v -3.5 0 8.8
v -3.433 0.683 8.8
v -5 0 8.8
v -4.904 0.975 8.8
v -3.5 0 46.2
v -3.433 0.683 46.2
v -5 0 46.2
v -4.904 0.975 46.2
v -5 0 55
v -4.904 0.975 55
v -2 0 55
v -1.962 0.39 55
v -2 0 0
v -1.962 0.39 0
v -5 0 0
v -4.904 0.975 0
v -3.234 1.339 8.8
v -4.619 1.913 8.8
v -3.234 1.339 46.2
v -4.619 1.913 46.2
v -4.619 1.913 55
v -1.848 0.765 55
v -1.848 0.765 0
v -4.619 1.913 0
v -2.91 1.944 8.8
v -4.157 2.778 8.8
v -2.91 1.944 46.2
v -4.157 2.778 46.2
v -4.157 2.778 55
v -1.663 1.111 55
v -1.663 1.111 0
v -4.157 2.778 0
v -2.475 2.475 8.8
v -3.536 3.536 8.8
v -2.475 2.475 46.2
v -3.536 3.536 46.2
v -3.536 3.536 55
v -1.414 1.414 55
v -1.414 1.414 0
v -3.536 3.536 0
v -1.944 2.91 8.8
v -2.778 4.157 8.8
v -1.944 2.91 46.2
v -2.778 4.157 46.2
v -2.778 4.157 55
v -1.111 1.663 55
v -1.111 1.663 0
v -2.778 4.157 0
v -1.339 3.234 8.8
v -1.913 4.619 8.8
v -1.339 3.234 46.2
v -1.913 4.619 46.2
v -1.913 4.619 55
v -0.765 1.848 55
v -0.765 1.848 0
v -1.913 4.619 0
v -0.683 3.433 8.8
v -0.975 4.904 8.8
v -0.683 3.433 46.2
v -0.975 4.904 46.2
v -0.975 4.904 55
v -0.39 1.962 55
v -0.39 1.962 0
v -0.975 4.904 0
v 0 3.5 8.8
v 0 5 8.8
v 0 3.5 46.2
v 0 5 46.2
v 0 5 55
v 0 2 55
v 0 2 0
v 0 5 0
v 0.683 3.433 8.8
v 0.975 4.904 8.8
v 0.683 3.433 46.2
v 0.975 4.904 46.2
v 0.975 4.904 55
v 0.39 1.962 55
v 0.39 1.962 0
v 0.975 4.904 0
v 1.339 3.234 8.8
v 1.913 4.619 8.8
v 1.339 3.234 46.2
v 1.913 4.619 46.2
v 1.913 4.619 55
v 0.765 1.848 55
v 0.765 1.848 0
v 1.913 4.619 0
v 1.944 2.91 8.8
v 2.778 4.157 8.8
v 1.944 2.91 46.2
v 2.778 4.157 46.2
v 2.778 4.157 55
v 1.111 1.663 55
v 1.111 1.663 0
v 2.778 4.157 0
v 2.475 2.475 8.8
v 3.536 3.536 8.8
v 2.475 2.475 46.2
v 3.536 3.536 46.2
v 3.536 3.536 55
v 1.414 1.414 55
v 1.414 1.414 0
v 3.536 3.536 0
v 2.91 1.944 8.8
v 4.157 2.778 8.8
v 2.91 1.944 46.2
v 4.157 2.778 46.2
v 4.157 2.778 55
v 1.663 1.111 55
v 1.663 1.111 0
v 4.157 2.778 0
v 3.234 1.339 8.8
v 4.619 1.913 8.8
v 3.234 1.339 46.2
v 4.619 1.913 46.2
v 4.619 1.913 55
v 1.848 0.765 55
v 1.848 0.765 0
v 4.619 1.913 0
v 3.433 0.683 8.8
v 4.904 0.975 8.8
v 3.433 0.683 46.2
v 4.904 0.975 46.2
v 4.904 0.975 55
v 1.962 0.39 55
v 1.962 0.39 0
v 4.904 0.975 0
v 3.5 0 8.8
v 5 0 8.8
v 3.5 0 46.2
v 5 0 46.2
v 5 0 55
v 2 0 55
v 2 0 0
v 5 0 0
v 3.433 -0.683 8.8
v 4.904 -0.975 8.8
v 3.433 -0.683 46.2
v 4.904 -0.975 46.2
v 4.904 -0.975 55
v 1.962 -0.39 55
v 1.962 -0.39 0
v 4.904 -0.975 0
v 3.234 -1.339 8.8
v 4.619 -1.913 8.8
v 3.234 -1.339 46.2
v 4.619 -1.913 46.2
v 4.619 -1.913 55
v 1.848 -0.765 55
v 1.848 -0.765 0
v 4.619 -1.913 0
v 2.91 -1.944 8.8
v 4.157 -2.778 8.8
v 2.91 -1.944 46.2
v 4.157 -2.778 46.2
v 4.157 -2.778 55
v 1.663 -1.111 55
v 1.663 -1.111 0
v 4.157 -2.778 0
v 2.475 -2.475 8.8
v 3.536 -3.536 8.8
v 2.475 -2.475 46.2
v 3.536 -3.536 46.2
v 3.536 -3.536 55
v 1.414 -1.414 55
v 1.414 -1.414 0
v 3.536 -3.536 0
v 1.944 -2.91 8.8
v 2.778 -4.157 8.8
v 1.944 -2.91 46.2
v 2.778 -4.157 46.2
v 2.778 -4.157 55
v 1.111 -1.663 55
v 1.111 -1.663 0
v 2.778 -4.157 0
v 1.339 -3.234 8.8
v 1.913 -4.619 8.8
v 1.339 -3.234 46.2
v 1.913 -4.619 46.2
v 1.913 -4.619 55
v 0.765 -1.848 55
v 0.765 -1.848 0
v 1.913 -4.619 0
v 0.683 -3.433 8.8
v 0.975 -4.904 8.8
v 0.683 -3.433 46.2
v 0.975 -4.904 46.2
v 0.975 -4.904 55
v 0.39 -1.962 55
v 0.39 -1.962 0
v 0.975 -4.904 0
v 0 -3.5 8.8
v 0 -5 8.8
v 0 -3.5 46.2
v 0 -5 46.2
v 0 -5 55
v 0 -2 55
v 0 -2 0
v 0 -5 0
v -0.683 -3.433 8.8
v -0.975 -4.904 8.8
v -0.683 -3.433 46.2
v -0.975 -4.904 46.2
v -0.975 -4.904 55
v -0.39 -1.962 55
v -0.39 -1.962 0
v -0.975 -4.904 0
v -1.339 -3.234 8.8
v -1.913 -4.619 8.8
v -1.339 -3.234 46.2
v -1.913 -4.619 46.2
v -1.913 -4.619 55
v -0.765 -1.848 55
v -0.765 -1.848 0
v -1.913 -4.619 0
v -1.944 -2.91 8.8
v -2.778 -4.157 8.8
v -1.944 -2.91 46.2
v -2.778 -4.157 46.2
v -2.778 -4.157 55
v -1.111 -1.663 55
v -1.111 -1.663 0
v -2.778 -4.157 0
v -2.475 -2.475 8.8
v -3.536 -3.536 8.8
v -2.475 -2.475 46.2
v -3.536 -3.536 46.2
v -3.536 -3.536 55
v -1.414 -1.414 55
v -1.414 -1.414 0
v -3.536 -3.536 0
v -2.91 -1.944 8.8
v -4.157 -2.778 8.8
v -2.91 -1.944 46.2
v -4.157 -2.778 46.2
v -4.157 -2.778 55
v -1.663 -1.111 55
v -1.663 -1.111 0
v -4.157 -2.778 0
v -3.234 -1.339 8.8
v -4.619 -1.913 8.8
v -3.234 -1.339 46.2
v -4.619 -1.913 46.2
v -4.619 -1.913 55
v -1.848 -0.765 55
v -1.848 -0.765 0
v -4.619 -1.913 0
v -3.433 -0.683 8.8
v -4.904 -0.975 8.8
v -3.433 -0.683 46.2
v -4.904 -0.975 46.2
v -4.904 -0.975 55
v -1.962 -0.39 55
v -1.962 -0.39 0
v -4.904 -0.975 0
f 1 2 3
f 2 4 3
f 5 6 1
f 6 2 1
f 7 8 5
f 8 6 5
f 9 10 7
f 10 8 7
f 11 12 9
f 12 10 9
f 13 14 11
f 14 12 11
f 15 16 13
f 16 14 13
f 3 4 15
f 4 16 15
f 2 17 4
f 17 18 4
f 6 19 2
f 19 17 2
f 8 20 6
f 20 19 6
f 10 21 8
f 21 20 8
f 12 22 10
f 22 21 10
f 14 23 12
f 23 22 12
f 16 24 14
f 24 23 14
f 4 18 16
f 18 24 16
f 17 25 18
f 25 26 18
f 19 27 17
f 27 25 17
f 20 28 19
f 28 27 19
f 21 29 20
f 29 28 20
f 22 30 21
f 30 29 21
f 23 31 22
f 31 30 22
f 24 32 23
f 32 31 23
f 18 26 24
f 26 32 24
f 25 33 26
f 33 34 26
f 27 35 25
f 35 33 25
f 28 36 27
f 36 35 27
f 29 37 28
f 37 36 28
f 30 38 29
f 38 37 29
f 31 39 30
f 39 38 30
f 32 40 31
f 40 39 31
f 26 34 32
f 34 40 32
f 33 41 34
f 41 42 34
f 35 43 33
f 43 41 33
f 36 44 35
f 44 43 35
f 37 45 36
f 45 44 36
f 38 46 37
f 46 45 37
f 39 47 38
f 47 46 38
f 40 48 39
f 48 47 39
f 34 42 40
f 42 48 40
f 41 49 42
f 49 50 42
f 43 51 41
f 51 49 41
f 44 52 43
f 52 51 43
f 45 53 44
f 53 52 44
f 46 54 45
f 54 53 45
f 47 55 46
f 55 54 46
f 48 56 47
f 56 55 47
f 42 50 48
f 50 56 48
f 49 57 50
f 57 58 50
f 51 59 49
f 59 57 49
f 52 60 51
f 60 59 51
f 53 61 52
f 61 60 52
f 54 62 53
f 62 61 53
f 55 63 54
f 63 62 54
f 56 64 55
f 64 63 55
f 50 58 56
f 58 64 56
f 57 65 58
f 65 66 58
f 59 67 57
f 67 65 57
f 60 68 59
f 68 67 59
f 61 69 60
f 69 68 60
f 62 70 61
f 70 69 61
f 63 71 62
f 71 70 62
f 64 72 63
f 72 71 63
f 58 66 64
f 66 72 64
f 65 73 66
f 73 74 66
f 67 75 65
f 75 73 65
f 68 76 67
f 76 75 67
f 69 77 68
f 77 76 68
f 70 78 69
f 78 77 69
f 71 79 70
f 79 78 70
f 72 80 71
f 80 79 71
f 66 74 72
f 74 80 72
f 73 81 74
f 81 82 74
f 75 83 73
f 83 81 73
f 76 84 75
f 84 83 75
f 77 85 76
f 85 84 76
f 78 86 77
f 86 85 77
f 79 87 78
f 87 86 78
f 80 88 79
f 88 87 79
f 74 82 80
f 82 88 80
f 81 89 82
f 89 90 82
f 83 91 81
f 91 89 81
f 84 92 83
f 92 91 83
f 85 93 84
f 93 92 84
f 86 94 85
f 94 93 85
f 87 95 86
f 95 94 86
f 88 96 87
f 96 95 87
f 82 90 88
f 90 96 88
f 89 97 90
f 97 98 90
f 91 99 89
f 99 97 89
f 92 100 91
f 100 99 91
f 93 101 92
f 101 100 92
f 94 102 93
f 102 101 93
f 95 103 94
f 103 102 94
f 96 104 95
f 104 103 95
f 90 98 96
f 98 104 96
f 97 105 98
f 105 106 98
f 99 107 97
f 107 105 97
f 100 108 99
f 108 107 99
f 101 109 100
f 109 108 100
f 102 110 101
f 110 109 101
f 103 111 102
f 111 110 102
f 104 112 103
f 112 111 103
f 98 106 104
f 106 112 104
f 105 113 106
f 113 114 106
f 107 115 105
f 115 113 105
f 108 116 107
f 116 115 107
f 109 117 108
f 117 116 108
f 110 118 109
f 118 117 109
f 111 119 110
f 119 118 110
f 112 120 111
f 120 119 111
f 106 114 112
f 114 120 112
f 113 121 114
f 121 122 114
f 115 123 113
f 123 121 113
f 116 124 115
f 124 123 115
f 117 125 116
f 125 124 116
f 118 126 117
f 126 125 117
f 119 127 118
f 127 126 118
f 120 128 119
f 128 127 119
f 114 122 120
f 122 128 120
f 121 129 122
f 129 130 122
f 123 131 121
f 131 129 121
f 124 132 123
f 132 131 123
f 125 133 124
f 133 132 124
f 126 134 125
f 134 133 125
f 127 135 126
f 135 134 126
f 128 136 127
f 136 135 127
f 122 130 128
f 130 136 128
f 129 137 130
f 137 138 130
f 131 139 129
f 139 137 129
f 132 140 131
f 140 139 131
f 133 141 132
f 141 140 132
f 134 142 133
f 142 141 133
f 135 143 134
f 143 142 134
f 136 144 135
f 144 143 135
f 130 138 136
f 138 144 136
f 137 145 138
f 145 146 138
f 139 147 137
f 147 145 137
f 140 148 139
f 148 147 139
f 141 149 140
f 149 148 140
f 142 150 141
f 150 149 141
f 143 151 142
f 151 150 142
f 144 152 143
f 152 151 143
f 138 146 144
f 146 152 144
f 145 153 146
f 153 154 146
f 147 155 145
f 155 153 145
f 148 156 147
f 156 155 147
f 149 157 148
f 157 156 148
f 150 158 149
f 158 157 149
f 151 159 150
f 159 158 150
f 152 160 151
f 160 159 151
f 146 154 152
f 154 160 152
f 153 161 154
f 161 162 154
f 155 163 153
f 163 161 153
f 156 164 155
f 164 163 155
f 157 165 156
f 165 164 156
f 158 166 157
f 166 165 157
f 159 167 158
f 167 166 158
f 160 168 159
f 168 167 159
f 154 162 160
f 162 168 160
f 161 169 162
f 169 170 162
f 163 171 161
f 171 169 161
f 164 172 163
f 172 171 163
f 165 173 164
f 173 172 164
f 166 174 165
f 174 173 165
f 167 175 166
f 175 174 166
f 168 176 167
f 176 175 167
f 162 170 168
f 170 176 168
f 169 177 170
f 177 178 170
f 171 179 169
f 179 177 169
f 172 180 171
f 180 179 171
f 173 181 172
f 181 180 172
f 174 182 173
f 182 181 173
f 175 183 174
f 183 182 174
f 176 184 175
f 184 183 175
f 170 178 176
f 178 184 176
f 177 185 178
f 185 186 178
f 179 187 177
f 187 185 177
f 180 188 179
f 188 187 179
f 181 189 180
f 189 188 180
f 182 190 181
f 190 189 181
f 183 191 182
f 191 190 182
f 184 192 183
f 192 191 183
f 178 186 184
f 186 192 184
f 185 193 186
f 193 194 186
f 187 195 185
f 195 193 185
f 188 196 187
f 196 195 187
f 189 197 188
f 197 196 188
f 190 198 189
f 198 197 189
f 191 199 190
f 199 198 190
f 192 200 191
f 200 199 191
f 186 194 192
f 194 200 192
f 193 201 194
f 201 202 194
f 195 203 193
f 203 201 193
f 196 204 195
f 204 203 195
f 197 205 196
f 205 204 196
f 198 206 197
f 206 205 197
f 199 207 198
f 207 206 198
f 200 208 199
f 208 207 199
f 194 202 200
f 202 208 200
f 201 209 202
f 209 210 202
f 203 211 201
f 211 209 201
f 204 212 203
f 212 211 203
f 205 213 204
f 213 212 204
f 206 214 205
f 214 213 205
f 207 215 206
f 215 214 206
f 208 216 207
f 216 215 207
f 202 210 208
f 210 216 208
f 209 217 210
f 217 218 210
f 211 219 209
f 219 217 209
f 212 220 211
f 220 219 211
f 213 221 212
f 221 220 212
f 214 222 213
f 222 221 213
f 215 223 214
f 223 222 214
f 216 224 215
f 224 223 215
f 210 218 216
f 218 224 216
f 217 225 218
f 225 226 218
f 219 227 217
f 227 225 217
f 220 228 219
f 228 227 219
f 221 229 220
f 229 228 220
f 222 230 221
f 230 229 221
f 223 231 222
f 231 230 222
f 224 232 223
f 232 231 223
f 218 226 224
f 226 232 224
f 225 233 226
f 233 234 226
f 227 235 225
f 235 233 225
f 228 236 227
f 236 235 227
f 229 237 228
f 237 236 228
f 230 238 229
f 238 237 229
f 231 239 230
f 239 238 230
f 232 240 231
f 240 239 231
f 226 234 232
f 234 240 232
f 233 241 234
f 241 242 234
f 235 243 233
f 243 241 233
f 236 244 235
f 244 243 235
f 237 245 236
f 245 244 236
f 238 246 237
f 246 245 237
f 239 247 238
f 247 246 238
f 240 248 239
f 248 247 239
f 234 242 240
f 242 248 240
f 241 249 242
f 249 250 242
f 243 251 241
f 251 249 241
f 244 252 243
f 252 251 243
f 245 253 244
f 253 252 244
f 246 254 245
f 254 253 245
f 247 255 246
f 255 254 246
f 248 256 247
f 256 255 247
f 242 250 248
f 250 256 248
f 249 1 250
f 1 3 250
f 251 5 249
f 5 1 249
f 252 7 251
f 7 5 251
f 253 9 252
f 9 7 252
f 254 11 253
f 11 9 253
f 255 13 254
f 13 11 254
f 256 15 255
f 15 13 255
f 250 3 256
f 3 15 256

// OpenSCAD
$fn = 32;

// ----------------------------------------------------------------------
// Profiled standoff: spool spacer, 55 mm long, bore 4 mm
// ----------------------------------------------------------------------

// --- parameters (mm) ---
revolve_angle = 360;      // full turn around the Z axis
profile_points = 8;       // points of the closed outline

profile = [[2, 0], [5, 0], [5, 8.8], [3.5, 8.8], [3.5, 46.2], [5, 46.2], [5, 55], [2, 55]];  // single closed polygon, 8 points, counter clockwise

// --- the one profile operation ---
rotate_extrude(angle = revolve_angle) polygon(points = profile);
